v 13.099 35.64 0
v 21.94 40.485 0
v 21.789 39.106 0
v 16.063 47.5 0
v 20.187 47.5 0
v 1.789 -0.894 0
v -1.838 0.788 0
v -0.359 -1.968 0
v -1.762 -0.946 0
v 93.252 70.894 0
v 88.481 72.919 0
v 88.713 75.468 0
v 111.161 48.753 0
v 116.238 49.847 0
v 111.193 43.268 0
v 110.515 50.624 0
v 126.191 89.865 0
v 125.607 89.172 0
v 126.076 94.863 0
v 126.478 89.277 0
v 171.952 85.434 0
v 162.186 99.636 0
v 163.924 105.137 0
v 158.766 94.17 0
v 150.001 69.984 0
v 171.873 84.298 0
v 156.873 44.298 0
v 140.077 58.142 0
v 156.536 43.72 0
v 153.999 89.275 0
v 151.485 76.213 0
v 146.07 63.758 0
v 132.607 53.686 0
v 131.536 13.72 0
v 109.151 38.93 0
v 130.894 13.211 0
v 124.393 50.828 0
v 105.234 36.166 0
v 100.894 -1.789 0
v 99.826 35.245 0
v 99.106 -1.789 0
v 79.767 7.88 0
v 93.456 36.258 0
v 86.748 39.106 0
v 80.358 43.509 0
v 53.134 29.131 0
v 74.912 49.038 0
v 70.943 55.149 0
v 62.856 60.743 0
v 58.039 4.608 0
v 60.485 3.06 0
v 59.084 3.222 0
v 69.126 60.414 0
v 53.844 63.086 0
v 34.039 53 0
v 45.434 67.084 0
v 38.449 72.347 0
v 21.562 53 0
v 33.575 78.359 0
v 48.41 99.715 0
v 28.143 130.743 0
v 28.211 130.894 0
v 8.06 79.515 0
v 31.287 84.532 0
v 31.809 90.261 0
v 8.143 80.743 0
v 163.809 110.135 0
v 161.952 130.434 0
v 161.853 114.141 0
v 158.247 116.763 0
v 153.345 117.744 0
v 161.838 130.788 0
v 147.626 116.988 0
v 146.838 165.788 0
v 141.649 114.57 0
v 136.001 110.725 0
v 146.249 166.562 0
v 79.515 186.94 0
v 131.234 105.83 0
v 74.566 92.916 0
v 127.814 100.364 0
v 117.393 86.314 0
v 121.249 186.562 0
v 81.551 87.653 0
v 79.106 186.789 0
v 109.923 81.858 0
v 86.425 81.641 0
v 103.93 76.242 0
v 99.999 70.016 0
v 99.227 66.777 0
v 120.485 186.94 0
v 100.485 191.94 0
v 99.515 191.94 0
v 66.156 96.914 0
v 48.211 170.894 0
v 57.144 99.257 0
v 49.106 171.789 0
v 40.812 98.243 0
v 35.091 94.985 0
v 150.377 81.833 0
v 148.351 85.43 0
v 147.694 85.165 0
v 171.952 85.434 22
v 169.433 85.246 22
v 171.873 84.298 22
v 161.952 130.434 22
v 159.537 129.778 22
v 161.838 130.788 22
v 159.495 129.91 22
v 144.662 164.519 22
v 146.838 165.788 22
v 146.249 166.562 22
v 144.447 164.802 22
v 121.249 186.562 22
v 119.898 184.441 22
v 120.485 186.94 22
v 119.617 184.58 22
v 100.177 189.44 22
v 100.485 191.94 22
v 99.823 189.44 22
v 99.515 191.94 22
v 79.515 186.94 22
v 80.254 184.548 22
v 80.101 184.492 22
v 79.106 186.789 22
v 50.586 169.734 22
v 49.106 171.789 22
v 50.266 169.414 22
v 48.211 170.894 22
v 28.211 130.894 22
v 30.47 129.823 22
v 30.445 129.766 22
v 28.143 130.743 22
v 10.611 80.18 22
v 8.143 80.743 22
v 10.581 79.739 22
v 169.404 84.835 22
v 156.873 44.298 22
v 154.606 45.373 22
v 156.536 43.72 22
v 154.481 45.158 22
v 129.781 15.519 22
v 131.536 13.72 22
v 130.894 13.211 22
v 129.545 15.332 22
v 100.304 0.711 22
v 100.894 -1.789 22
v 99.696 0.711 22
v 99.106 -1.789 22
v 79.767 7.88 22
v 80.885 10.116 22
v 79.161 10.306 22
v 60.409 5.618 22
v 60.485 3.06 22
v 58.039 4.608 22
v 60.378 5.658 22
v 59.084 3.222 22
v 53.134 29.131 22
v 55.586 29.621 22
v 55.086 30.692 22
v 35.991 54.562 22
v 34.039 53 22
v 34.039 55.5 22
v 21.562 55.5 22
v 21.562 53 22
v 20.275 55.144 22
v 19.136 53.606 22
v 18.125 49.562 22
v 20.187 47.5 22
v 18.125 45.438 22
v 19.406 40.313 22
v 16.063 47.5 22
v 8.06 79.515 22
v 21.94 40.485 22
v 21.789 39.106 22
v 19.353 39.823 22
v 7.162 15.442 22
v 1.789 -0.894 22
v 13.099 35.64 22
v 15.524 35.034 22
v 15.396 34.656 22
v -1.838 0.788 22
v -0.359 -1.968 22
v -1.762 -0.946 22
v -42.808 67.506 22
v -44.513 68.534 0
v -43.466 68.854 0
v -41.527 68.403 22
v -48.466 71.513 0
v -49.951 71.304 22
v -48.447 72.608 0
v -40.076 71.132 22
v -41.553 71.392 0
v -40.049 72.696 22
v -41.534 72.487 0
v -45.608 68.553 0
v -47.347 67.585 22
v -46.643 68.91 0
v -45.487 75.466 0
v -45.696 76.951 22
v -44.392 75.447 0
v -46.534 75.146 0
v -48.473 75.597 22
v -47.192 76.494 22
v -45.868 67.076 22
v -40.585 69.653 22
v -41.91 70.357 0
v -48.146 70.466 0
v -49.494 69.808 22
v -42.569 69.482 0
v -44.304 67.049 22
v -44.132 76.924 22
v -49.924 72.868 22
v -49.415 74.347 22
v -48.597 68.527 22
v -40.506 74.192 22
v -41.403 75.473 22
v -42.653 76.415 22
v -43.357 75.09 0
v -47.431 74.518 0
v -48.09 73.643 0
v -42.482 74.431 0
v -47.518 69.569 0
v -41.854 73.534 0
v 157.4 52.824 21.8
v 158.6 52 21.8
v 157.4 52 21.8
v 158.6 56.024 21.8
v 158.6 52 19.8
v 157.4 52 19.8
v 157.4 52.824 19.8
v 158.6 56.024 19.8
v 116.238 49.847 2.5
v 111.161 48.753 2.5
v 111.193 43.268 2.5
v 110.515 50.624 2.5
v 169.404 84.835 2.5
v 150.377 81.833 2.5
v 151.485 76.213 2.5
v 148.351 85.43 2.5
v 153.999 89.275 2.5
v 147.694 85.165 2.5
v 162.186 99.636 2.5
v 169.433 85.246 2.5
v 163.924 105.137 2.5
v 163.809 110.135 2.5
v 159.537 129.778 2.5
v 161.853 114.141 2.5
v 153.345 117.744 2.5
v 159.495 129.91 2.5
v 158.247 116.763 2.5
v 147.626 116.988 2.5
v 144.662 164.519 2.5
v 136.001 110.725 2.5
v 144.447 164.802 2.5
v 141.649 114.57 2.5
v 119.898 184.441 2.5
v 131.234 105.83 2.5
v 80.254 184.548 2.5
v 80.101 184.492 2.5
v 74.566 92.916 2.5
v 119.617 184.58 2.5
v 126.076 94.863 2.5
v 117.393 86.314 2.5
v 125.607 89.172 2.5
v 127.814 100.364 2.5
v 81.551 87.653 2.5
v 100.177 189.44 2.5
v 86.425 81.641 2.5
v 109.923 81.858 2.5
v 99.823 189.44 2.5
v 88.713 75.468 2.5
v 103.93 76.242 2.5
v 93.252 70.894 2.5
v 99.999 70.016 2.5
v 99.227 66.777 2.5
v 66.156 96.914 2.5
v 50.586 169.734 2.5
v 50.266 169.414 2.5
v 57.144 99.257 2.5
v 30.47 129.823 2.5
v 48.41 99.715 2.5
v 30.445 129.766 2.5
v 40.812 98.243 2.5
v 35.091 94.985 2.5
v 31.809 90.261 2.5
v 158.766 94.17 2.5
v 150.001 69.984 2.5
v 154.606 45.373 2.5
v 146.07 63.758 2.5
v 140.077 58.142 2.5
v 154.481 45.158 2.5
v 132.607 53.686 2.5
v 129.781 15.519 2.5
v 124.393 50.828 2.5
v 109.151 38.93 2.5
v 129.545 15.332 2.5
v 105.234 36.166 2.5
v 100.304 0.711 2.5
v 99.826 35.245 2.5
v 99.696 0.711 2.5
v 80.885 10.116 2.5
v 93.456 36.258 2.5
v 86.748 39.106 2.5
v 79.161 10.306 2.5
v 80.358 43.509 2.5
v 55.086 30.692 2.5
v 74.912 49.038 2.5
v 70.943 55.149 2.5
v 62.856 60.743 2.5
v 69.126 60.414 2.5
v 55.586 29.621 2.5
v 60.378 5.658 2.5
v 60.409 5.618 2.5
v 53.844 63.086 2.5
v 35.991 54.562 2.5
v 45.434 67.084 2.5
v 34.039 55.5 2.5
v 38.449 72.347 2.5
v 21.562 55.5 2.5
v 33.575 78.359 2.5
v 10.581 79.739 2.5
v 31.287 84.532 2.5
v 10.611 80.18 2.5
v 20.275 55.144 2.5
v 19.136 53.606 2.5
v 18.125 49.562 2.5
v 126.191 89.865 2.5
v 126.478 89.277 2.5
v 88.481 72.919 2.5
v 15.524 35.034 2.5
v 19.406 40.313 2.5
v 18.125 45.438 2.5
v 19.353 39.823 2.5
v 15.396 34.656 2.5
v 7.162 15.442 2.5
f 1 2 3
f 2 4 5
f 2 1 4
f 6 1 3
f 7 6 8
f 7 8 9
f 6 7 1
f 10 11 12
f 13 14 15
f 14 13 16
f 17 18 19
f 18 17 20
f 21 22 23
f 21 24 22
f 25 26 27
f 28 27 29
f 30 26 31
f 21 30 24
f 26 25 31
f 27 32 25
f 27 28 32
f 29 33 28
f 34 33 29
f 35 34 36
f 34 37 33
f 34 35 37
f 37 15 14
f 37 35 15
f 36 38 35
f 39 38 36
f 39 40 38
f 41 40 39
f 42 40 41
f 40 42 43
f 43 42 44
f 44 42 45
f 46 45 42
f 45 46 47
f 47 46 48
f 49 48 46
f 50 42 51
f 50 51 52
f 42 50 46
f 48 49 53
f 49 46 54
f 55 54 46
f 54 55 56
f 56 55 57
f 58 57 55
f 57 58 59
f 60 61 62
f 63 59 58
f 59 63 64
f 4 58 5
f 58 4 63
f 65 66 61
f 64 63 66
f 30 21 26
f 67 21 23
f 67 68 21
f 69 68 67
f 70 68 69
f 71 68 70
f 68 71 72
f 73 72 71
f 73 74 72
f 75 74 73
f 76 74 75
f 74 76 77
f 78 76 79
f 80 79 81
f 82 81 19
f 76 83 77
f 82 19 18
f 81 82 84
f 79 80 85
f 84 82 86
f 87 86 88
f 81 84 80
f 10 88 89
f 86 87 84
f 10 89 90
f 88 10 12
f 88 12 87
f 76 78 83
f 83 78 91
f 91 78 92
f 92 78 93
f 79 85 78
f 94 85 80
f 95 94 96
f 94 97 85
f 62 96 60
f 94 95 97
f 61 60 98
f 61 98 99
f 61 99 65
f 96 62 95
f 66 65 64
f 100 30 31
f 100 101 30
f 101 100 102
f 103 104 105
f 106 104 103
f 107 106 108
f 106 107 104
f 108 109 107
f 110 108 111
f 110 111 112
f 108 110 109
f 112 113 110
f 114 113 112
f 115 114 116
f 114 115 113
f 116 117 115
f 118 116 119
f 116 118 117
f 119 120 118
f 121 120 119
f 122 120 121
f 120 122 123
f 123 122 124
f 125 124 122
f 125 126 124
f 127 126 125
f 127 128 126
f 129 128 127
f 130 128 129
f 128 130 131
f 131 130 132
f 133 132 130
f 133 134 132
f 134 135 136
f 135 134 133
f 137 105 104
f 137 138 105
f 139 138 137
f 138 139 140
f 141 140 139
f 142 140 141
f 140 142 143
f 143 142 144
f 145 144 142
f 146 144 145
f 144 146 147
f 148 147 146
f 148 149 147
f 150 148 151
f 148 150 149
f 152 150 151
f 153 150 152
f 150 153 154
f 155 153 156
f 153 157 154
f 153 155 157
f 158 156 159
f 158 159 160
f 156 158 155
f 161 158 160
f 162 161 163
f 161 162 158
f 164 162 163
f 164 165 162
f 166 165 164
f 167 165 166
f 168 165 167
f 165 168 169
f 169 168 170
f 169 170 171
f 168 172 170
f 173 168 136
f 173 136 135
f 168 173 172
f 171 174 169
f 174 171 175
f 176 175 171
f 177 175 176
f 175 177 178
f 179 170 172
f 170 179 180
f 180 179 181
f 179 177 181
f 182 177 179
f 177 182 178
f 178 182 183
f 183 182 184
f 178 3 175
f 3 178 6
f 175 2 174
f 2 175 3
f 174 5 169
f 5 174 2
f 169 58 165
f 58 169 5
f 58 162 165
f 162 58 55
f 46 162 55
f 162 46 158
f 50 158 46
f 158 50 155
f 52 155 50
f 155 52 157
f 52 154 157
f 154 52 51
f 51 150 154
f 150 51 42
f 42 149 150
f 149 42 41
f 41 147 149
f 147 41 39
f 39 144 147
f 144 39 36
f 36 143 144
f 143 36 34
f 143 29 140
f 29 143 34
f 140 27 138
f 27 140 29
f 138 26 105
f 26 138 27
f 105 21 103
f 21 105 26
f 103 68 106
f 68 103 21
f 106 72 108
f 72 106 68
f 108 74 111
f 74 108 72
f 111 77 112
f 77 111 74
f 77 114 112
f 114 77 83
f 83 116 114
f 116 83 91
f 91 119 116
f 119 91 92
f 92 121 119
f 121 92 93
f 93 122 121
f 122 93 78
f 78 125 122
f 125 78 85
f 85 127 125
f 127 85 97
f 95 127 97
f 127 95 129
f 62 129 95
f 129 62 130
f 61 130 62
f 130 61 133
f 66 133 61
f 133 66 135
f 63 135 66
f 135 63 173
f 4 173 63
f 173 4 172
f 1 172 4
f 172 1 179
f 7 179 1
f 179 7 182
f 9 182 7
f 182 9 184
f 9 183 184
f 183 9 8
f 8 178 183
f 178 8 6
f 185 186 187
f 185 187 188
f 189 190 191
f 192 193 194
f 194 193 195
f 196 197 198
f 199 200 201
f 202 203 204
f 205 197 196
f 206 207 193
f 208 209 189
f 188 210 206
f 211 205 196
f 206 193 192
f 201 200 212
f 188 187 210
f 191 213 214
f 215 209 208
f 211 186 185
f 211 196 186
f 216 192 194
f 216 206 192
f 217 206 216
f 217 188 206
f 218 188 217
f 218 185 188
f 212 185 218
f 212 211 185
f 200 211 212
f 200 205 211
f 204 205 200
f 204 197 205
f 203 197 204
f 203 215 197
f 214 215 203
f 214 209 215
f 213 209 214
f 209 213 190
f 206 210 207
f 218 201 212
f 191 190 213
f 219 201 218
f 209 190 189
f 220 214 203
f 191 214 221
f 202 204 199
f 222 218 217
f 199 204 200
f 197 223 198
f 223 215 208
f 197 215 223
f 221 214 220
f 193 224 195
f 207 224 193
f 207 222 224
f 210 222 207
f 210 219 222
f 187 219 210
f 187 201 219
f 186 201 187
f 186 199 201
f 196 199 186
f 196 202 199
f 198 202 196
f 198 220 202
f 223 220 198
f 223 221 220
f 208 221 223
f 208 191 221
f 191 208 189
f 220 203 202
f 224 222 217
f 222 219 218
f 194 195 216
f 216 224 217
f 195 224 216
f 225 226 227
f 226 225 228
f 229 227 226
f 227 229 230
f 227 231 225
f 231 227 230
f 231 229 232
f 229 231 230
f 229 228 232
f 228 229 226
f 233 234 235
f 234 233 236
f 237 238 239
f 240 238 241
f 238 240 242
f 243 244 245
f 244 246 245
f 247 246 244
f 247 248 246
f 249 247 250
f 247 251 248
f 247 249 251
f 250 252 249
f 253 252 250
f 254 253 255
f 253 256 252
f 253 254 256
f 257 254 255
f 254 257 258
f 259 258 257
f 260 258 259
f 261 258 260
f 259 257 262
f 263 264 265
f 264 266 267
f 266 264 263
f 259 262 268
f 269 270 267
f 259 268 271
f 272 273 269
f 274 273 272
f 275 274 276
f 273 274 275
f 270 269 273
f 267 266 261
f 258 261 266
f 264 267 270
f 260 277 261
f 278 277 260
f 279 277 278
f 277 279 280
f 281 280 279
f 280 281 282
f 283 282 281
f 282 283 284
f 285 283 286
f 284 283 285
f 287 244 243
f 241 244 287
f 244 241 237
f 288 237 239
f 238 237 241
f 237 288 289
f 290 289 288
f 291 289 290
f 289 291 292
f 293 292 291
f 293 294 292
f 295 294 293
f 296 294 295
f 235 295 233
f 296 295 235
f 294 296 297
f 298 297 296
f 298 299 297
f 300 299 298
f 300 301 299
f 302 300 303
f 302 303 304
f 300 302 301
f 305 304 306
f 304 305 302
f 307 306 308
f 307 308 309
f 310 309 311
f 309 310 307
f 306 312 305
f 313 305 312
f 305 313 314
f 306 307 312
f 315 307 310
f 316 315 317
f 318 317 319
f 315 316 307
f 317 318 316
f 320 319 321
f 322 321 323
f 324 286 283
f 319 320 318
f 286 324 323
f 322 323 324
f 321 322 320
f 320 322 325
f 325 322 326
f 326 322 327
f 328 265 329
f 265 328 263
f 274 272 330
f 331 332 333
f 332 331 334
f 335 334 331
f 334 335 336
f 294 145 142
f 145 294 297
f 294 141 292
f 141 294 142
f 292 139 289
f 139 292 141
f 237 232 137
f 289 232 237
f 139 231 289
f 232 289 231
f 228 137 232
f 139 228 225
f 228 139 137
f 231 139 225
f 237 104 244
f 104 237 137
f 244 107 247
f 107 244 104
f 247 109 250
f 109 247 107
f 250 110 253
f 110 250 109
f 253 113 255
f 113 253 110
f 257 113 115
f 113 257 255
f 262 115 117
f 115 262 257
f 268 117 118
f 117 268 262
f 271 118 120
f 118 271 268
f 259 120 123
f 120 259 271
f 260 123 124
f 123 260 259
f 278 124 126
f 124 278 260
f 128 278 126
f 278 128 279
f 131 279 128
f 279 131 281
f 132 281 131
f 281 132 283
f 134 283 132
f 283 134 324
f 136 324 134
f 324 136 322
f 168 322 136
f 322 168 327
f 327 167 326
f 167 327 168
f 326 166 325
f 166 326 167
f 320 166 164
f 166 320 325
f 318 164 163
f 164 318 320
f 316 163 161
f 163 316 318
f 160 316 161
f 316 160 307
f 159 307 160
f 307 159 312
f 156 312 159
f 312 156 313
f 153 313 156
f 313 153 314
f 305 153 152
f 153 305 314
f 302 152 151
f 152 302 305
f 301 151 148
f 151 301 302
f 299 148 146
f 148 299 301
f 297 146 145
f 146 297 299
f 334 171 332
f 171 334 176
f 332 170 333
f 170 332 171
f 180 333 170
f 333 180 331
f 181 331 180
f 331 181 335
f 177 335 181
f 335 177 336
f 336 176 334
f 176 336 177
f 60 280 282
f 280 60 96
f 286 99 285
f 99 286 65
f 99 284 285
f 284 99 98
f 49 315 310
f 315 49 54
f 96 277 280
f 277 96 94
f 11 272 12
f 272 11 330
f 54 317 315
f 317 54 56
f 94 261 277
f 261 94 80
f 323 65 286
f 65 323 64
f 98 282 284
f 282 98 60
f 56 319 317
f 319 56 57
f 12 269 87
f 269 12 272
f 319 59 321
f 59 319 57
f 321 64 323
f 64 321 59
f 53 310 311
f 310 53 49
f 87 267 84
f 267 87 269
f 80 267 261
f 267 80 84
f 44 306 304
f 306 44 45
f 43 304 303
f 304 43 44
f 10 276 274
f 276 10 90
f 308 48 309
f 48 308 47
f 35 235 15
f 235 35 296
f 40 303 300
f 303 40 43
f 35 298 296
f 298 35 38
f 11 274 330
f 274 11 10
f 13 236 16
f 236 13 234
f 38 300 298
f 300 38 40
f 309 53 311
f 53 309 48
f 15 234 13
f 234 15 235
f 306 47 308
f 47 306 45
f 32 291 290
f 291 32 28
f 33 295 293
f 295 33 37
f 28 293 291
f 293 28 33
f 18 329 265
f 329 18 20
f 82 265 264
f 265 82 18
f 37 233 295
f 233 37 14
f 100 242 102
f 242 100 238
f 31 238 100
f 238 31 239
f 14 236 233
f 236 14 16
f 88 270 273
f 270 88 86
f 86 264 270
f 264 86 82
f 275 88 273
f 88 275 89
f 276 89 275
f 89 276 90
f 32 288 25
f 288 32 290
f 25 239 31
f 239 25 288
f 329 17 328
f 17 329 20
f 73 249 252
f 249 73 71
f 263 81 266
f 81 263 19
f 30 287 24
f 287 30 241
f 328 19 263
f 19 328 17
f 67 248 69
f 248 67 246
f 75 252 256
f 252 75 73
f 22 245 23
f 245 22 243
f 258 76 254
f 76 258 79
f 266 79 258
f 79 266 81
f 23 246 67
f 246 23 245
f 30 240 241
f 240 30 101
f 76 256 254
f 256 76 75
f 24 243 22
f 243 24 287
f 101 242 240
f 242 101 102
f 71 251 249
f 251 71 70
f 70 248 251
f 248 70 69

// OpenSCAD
// Monstera Leaf Bowl / Tray
// Iconic tropical leaf shape — keys, coins, jewelry dish
// PLA/PETG — 0.2mm, 3 walls, 15% infill, no supports
// Print flat on bed — natural look, zero support needed

LEAF_L   = 200;  // Leaf length
LEAF_W   = 160;  // Max leaf width
BOWL_H   = 22;   // Rim height
WALL_T   = 2.5;
STEM_L   = 45;
STEM_D   = 10;

// Monstera leaf outline (simplified, stylized)
module leaf_2d() {
    scale([LEAF_L/200, LEAF_W/160])
    offset(r = 2)
    polygon([
        // Main lobe
        [0, 0], [20, 40], [10, 80], [30, 130], [50, 170],
        [80, 185], [100, 190], [120, 185], [145, 165],
        [160, 130], [170, 85], [155, 45], [130, 15],
        [100, 0], [80, 10], [60, 5],
        // Left lobes (characteristic splits)
        [55, 30], [35, 55], [20, 55], [15, 35],
        // Back to base
        [0, 0]
    ]);
}

module split_cutout(x, y, w, h, angle) {
    translate([x, y, -1])
        rotate([0, 0, angle])
            linear_extrude(BOWL_H + 2)
                scale([w, h])
                    circle(r = 1, $fn = 20);
}

module stem() {
    translate([-STEM_L, LEAF_W * 0.45, 0])
        rotate([0, 0, -10])
            cylinder(d1 = STEM_D * 0.7, d2 = STEM_D, h = BOWL_H, $fn = 20);
}

difference() {
    union() {
        // Bowl body from leaf outline
        linear_extrude(BOWL_H)
            leaf_2d();
        stem();
    }
    // Hollow interior
    translate([0, 0, WALL_T])
        linear_extrude(BOWL_H)
            offset(r = -WALL_T)
                leaf_2d();
    // Monstera splits (the characteristic holes)
    split_cutout(60,  80,  18, 30, 70);
    split_cutout(90,  55,  15, 25, 50);
    split_cutout(125, 70,  18, 28, 115);
    split_cutout(145, 100, 14, 22, 130);
    // Vein texture on top rim
    for (i = [0:6])
        translate([50 + i*18, 120 - i*8, BOWL_H - 1.2])
            rotate([0, 0, 60 + i*5])
                cube([40, 1.2, 2], center = true);
}
